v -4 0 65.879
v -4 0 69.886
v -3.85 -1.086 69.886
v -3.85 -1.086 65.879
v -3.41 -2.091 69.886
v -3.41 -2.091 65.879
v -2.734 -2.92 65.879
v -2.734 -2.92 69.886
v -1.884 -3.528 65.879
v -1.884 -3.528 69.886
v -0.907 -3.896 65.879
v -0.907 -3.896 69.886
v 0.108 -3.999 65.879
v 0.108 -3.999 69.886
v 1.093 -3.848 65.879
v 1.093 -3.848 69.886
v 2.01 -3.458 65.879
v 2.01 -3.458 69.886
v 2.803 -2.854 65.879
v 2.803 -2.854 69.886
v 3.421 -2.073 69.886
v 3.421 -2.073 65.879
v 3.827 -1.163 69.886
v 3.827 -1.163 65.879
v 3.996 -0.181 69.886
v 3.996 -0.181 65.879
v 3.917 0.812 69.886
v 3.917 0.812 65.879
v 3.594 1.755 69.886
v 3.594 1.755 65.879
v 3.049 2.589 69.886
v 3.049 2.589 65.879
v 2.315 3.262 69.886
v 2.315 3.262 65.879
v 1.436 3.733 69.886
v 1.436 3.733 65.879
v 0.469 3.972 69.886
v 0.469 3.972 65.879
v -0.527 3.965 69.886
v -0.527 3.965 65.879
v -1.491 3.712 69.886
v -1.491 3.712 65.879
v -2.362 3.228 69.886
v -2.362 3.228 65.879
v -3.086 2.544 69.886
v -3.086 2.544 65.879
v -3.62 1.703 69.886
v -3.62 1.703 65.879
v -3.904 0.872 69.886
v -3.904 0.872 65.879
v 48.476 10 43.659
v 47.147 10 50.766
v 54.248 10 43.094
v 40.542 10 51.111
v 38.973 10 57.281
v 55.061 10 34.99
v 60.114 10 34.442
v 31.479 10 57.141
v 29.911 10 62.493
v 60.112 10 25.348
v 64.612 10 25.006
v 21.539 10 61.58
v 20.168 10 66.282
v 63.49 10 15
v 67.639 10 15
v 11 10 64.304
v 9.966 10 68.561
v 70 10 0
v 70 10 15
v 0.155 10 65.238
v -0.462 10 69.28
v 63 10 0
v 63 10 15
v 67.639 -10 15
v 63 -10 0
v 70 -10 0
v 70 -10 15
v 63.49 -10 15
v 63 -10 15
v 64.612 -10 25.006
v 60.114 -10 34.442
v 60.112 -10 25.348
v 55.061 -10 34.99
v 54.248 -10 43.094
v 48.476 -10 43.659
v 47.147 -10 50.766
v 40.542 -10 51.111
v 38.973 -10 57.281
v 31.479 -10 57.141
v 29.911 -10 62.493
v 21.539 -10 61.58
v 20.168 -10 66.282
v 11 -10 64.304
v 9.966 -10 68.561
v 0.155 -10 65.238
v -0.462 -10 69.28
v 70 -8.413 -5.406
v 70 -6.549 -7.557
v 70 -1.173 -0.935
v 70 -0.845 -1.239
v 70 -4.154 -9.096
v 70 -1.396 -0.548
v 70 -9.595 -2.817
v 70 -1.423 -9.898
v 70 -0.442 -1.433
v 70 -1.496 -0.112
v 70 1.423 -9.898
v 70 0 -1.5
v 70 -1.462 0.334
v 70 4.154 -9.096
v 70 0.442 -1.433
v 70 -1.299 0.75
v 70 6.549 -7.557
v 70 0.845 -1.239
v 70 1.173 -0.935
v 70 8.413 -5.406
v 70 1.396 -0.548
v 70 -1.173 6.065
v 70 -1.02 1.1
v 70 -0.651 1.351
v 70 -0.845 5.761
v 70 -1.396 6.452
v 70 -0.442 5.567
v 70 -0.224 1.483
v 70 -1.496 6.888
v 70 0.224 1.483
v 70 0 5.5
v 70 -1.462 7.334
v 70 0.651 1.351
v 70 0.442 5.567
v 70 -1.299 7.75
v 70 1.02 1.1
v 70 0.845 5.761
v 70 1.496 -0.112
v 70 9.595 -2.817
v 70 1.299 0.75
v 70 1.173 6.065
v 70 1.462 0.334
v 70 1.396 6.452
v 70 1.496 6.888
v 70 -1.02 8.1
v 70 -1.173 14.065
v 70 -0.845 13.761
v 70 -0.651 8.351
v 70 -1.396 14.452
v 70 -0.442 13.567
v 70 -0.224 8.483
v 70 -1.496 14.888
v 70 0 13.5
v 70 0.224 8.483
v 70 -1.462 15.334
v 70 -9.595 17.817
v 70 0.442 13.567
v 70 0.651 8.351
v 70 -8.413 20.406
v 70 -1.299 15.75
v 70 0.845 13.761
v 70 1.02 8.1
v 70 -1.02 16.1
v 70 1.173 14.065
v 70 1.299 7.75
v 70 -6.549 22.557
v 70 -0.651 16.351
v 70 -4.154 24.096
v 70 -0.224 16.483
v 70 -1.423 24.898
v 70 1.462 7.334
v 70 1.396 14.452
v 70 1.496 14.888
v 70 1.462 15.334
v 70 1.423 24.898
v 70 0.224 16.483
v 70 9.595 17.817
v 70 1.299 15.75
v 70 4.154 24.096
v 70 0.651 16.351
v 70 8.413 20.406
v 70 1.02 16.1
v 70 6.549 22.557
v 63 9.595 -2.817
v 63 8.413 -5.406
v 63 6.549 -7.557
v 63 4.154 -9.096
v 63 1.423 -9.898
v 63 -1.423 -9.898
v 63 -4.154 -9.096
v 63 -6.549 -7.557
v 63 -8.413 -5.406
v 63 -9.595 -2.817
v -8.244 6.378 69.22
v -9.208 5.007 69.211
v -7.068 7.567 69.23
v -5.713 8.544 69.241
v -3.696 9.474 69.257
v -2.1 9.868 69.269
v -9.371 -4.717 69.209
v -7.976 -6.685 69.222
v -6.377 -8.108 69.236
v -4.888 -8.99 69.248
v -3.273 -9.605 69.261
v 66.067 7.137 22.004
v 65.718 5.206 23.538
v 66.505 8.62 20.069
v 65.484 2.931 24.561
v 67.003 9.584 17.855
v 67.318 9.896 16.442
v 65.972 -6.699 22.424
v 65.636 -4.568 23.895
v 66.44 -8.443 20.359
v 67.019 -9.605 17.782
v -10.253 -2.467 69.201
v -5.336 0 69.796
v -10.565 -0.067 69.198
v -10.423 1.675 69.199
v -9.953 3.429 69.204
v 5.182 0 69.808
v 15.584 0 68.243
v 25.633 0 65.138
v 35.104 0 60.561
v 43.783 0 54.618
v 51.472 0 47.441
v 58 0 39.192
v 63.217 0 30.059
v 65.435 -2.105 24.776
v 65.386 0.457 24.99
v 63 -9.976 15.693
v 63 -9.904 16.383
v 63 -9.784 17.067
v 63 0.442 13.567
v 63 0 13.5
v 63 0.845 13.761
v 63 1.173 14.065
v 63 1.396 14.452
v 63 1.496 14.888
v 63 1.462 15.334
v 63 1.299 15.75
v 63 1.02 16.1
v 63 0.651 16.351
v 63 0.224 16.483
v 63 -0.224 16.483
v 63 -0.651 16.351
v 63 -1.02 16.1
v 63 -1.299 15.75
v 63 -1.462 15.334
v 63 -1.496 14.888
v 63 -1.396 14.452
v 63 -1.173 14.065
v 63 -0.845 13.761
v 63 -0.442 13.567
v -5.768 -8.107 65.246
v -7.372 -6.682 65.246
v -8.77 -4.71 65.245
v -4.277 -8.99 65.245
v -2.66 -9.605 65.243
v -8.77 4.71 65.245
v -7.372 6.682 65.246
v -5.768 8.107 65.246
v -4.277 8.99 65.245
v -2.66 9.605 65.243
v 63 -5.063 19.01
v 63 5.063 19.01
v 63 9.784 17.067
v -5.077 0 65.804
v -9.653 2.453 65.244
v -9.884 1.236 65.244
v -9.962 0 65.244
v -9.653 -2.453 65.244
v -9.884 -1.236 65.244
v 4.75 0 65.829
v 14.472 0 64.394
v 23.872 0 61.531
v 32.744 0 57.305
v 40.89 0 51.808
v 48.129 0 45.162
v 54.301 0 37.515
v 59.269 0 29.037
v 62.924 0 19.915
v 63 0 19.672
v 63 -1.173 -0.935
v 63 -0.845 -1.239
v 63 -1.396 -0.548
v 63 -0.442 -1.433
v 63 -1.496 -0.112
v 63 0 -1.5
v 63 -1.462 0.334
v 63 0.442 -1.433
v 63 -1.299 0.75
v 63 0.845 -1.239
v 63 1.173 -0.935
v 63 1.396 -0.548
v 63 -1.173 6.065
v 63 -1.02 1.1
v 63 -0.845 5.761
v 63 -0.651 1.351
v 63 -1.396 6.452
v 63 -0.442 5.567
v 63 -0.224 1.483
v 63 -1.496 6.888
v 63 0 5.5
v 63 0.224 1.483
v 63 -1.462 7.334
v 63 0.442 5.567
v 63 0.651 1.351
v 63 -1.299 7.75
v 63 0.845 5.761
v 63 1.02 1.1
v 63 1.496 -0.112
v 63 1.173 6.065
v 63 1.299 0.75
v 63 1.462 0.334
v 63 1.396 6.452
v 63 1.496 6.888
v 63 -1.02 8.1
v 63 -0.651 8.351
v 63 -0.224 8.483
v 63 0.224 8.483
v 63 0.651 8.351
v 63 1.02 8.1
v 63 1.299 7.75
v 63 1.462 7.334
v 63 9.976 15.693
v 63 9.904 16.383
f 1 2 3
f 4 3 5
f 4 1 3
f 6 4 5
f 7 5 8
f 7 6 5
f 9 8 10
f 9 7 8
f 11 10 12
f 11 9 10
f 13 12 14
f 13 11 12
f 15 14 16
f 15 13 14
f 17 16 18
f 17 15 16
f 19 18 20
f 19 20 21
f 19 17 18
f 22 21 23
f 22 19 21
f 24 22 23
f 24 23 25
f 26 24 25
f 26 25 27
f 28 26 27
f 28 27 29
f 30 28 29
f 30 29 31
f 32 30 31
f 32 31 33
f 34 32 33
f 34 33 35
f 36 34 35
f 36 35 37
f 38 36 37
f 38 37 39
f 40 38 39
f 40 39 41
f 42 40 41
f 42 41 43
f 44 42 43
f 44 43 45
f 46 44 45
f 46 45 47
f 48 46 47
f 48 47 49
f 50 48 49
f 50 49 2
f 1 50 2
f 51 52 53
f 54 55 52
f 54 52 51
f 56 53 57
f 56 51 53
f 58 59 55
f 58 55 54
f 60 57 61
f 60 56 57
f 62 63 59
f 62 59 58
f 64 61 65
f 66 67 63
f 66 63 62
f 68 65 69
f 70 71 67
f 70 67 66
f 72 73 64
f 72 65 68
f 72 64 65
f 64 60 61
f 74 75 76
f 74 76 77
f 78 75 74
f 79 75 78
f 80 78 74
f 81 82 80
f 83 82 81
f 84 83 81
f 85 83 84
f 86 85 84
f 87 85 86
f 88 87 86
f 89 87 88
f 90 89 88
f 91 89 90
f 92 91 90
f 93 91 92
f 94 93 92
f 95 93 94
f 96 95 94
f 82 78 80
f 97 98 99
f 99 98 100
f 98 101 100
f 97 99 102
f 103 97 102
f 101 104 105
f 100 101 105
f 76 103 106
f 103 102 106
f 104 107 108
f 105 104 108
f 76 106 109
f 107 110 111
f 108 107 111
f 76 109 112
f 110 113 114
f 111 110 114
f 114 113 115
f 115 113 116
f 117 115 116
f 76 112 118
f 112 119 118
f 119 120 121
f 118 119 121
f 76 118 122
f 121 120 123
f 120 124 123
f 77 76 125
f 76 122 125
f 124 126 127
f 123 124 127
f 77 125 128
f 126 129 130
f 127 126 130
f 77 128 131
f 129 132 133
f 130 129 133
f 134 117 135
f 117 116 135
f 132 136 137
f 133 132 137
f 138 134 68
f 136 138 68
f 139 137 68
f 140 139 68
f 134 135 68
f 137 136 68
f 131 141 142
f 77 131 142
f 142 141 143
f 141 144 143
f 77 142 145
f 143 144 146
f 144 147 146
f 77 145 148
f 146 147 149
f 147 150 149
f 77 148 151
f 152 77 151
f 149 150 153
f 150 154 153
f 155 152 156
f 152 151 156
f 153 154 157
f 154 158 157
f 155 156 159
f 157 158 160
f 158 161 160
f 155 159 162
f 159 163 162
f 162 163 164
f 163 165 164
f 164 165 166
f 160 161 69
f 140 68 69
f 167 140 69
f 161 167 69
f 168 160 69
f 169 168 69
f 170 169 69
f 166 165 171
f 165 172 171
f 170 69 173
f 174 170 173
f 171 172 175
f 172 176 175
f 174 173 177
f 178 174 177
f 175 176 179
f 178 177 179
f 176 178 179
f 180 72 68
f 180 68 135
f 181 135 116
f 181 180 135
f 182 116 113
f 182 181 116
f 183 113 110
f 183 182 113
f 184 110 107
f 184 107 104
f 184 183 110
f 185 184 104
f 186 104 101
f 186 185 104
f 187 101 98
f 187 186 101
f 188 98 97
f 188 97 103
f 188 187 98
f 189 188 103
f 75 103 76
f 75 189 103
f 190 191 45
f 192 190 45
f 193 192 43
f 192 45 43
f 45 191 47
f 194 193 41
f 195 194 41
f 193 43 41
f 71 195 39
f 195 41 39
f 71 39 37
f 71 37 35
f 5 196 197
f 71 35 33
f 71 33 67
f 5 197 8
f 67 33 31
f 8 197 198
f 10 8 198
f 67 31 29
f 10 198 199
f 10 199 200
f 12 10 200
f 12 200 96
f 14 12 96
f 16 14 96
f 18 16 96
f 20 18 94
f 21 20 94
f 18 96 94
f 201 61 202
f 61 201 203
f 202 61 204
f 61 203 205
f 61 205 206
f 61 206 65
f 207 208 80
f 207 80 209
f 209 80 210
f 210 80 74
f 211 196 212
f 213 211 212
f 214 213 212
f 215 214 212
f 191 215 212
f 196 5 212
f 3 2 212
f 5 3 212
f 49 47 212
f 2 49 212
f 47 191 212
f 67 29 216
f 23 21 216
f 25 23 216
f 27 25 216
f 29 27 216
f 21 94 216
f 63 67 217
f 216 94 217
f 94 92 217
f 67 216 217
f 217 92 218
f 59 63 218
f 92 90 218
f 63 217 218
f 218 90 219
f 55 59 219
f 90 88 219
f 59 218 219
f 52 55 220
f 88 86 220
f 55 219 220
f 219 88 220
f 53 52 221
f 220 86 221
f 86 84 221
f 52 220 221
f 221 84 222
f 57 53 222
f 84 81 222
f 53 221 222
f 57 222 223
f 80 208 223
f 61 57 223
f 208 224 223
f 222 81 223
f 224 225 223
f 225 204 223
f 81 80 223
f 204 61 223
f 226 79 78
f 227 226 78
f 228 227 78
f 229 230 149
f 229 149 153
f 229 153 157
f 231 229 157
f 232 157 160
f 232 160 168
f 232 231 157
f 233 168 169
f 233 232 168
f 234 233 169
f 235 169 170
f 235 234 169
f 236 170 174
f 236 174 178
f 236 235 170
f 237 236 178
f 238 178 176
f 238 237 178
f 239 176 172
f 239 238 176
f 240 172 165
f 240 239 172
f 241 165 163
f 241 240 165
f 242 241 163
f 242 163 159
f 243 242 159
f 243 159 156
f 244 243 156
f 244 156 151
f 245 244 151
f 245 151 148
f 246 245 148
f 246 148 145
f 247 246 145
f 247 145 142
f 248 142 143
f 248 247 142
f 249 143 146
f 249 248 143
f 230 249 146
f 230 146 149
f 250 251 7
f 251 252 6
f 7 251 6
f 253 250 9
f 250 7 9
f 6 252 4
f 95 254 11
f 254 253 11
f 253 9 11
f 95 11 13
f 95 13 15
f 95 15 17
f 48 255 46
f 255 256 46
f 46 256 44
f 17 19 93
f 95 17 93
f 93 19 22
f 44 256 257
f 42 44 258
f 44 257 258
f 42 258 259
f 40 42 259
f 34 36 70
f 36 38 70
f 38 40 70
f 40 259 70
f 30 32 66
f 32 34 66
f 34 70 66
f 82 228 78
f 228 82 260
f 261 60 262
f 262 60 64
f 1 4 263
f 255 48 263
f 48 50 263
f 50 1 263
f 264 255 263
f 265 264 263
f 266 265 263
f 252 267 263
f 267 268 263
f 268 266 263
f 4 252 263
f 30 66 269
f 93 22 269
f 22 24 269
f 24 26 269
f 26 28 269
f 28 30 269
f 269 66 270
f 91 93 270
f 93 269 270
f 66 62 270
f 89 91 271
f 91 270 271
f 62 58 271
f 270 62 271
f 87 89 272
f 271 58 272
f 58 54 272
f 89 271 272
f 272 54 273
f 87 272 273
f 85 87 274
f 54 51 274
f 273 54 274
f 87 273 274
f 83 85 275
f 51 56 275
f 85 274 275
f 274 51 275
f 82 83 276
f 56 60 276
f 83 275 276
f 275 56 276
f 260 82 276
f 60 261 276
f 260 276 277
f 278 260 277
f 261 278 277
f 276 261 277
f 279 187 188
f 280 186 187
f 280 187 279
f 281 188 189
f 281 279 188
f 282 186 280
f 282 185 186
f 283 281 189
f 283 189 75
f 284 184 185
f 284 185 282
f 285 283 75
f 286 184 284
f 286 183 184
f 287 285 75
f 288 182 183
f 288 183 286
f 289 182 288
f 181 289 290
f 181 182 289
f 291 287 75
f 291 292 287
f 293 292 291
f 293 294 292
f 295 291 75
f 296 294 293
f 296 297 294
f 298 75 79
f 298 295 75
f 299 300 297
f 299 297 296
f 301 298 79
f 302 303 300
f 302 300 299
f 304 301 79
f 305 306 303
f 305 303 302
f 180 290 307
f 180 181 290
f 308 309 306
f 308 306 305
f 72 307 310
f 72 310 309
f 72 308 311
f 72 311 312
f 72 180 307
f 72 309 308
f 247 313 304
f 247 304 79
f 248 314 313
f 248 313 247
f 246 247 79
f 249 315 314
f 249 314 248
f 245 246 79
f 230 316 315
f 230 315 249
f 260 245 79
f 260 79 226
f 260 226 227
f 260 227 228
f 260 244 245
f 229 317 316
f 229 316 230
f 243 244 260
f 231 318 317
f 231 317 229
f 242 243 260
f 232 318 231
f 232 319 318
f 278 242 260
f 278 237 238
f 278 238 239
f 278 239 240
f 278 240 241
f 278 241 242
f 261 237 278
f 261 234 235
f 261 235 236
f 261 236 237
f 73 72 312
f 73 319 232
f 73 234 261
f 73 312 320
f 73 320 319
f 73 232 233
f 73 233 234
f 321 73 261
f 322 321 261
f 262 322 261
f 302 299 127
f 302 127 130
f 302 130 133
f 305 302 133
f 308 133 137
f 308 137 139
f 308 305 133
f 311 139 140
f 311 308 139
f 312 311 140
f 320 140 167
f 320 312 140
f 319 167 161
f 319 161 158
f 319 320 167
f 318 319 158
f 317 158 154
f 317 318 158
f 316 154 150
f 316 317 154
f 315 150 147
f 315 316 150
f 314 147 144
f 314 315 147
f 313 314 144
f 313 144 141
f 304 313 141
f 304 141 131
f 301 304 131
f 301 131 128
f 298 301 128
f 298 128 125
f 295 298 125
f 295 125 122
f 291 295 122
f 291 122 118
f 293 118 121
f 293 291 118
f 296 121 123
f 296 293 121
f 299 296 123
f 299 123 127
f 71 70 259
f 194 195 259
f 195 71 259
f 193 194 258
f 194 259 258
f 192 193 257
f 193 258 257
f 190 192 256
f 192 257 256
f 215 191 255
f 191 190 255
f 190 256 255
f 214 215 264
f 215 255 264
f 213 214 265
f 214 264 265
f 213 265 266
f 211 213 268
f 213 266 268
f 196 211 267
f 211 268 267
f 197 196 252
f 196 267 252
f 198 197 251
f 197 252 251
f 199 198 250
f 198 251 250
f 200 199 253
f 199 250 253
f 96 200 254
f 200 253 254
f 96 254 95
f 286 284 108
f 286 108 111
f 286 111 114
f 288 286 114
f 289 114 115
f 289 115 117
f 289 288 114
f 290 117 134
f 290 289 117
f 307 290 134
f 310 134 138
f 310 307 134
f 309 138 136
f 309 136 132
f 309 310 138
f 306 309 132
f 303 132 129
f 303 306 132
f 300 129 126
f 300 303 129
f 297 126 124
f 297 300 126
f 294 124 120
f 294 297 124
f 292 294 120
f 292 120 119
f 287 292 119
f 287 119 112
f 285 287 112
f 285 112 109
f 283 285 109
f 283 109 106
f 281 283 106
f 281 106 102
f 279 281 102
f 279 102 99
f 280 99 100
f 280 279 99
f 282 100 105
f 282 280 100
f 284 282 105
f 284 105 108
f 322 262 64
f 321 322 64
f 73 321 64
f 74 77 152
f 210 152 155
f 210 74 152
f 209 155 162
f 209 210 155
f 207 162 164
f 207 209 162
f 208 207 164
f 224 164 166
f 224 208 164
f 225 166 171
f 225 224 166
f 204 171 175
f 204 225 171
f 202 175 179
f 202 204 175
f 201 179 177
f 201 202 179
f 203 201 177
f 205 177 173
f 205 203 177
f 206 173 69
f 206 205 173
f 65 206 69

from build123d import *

# Parameters (mm, degrees)
REVOLVE_1_ANGLE           = 98.68117871
REVOLVE_1_OTHER_WAY_ANGLE = 8.68117871
SKETCH_3_R                = 4
CUT_EXTRUDE_1_DEPTH       = 100.498743711
SKETCH_4_R                = 1.5
CUT_EXTRUDE_2_DEPTH       = 100.41830825
CUT_EXTRUDE_3_DEPTH       = 102.960221512
FILLET_1_R                = 10
EXTRUDE_START             = -7
SKETCH_8_R                = 1.5
EXTRUDE_1_DEPTH           = 7


with BuildPart() as part:
    # 草图2 → 旋转1 (revolve)
    with BuildSketch(Plane.XY):
        with BuildLine():
            Line((65.238025721, 10), (69.282032303, 10))
            ThreePointArc((69.282032303, 10), (70, 0), (69.282032303, -10))
            Line((69.282032303, -10), (65.238025721, -10))
            ThreePointArc((65.238025721, -10), (66, 0), (65.238025721, 10))
        make_face()
    revolve(axis=Axis((0, 0, 0), (0, -1, 0)), revolution_arc=REVOLVE_1_ANGLE)

    # 草图2 → 旋转1 other way (revolve)
    with BuildSketch(Plane.XY):
        with BuildLine():
            Line((65.238025721, 10), (69.282032303, 10))
            ThreePointArc((69.282032303, 10), (70, 0), (69.282032303, -10))
            Line((69.282032303, -10), (65.238025721, -10))
            ThreePointArc((65.238025721, -10), (66, 0), (65.238025721, 10))
        make_face()
    revolve(axis=Axis((0, 0, 0), (0, 1, 0)), revolution_arc=REVOLVE_1_OTHER_WAY_ANGLE)

    # 草图3 → 切除-拉伸1 (cut, through all)
    with BuildSketch(Plane.XY):
        with Locations(Location((0, 0, 0), (0, 0, 180))):
            Circle(SKETCH_3_R)
    extrude(amount=CUT_EXTRUDE_1_DEPTH, mode=Mode.SUBTRACT)

    # 草图4 → 切除-拉伸2 (cut, through all)
    with BuildSketch(Plane(origin=(0, 0, 0), x_dir=(0, 0, -1), z_dir=(1, 0, 0))):
        with Locations(Location((0, 0, 0), (0, 0, 180))):
            Circle(SKETCH_4_R)
    extrude(amount=CUT_EXTRUDE_2_DEPTH, mode=Mode.SUBTRACT)

    # 草图7 → 切除-拉伸3 (cut, through all)
    with BuildSketch(Plane(origin=(63, 0, 0), x_dir=(0, 0, -1), z_dir=(1, 0, 0))):
        with BuildLine():
            Line((25, -10), (-15, -10))
            ThreePointArc((-15, -10), (-25, 0), (-15, 10))
            Line((-15, 10), (25, 10))
            Line((25, 10), (25, -10))
        make_face()
    extrude(amount=CUT_EXTRUDE_3_DEPTH, mode=Mode.SUBTRACT)

    # 圆角1
    # the kernel refuses this fillet: 10 mm, written as the material it takes off along each edge
    with BuildSketch(Plane(origin=(-6.073370605, 10, 39.777039651), x_dir=(0.9885435216678339, 0, 0.15093609829512958), z_dir=(-0.15093609829512958, 0, 0.9885435216678339)), Plane(origin=(-14.230562095, -10, 93.201892243), x_dir=(0.9885435216678339, 0, 0.15093609829512958), z_dir=(0.15093609829512958, 0, -0.9885435216678339))) as fillet_1_piece_1:
        with BuildLine():
            CenterArc((FILLET_1_R, -FILLET_1_R), FILLET_1_R, 90, 90)
            Line((0, -FILLET_1_R), (0, 0))
            Line((0, 0), (FILLET_1_R, 0))
        make_face()
    extrude(amount=54.044006582, mode=Mode.SUBTRACT)

    # 草图8 → 凸台-拉伸1 (add)
    with BuildSketch(Plane(origin=(70, 0, 0), x_dir=(0, 0, -1), z_dir=(1, 0, 0)).offset(EXTRUDE_START)):
        with BuildLine():
            Line((-15, 10), (0, 10))
            ThreePointArc((0, 10), (10, 0), (0, -10))
            Line((0, -10), (-15, -10))
            ThreePointArc((-15, -10), (-25, 0), (-15, 10))
        make_face()
        Circle(SKETCH_8_R, mode=Mode.SUBTRACT)
        with Locations((-7, 0)):
            Circle(SKETCH_8_R, mode=Mode.SUBTRACT)
        with Locations((-15, 0)):
            Circle(SKETCH_8_R, mode=Mode.SUBTRACT)
    extrude(amount=EXTRUDE_1_DEPTH)


solid = part.part
